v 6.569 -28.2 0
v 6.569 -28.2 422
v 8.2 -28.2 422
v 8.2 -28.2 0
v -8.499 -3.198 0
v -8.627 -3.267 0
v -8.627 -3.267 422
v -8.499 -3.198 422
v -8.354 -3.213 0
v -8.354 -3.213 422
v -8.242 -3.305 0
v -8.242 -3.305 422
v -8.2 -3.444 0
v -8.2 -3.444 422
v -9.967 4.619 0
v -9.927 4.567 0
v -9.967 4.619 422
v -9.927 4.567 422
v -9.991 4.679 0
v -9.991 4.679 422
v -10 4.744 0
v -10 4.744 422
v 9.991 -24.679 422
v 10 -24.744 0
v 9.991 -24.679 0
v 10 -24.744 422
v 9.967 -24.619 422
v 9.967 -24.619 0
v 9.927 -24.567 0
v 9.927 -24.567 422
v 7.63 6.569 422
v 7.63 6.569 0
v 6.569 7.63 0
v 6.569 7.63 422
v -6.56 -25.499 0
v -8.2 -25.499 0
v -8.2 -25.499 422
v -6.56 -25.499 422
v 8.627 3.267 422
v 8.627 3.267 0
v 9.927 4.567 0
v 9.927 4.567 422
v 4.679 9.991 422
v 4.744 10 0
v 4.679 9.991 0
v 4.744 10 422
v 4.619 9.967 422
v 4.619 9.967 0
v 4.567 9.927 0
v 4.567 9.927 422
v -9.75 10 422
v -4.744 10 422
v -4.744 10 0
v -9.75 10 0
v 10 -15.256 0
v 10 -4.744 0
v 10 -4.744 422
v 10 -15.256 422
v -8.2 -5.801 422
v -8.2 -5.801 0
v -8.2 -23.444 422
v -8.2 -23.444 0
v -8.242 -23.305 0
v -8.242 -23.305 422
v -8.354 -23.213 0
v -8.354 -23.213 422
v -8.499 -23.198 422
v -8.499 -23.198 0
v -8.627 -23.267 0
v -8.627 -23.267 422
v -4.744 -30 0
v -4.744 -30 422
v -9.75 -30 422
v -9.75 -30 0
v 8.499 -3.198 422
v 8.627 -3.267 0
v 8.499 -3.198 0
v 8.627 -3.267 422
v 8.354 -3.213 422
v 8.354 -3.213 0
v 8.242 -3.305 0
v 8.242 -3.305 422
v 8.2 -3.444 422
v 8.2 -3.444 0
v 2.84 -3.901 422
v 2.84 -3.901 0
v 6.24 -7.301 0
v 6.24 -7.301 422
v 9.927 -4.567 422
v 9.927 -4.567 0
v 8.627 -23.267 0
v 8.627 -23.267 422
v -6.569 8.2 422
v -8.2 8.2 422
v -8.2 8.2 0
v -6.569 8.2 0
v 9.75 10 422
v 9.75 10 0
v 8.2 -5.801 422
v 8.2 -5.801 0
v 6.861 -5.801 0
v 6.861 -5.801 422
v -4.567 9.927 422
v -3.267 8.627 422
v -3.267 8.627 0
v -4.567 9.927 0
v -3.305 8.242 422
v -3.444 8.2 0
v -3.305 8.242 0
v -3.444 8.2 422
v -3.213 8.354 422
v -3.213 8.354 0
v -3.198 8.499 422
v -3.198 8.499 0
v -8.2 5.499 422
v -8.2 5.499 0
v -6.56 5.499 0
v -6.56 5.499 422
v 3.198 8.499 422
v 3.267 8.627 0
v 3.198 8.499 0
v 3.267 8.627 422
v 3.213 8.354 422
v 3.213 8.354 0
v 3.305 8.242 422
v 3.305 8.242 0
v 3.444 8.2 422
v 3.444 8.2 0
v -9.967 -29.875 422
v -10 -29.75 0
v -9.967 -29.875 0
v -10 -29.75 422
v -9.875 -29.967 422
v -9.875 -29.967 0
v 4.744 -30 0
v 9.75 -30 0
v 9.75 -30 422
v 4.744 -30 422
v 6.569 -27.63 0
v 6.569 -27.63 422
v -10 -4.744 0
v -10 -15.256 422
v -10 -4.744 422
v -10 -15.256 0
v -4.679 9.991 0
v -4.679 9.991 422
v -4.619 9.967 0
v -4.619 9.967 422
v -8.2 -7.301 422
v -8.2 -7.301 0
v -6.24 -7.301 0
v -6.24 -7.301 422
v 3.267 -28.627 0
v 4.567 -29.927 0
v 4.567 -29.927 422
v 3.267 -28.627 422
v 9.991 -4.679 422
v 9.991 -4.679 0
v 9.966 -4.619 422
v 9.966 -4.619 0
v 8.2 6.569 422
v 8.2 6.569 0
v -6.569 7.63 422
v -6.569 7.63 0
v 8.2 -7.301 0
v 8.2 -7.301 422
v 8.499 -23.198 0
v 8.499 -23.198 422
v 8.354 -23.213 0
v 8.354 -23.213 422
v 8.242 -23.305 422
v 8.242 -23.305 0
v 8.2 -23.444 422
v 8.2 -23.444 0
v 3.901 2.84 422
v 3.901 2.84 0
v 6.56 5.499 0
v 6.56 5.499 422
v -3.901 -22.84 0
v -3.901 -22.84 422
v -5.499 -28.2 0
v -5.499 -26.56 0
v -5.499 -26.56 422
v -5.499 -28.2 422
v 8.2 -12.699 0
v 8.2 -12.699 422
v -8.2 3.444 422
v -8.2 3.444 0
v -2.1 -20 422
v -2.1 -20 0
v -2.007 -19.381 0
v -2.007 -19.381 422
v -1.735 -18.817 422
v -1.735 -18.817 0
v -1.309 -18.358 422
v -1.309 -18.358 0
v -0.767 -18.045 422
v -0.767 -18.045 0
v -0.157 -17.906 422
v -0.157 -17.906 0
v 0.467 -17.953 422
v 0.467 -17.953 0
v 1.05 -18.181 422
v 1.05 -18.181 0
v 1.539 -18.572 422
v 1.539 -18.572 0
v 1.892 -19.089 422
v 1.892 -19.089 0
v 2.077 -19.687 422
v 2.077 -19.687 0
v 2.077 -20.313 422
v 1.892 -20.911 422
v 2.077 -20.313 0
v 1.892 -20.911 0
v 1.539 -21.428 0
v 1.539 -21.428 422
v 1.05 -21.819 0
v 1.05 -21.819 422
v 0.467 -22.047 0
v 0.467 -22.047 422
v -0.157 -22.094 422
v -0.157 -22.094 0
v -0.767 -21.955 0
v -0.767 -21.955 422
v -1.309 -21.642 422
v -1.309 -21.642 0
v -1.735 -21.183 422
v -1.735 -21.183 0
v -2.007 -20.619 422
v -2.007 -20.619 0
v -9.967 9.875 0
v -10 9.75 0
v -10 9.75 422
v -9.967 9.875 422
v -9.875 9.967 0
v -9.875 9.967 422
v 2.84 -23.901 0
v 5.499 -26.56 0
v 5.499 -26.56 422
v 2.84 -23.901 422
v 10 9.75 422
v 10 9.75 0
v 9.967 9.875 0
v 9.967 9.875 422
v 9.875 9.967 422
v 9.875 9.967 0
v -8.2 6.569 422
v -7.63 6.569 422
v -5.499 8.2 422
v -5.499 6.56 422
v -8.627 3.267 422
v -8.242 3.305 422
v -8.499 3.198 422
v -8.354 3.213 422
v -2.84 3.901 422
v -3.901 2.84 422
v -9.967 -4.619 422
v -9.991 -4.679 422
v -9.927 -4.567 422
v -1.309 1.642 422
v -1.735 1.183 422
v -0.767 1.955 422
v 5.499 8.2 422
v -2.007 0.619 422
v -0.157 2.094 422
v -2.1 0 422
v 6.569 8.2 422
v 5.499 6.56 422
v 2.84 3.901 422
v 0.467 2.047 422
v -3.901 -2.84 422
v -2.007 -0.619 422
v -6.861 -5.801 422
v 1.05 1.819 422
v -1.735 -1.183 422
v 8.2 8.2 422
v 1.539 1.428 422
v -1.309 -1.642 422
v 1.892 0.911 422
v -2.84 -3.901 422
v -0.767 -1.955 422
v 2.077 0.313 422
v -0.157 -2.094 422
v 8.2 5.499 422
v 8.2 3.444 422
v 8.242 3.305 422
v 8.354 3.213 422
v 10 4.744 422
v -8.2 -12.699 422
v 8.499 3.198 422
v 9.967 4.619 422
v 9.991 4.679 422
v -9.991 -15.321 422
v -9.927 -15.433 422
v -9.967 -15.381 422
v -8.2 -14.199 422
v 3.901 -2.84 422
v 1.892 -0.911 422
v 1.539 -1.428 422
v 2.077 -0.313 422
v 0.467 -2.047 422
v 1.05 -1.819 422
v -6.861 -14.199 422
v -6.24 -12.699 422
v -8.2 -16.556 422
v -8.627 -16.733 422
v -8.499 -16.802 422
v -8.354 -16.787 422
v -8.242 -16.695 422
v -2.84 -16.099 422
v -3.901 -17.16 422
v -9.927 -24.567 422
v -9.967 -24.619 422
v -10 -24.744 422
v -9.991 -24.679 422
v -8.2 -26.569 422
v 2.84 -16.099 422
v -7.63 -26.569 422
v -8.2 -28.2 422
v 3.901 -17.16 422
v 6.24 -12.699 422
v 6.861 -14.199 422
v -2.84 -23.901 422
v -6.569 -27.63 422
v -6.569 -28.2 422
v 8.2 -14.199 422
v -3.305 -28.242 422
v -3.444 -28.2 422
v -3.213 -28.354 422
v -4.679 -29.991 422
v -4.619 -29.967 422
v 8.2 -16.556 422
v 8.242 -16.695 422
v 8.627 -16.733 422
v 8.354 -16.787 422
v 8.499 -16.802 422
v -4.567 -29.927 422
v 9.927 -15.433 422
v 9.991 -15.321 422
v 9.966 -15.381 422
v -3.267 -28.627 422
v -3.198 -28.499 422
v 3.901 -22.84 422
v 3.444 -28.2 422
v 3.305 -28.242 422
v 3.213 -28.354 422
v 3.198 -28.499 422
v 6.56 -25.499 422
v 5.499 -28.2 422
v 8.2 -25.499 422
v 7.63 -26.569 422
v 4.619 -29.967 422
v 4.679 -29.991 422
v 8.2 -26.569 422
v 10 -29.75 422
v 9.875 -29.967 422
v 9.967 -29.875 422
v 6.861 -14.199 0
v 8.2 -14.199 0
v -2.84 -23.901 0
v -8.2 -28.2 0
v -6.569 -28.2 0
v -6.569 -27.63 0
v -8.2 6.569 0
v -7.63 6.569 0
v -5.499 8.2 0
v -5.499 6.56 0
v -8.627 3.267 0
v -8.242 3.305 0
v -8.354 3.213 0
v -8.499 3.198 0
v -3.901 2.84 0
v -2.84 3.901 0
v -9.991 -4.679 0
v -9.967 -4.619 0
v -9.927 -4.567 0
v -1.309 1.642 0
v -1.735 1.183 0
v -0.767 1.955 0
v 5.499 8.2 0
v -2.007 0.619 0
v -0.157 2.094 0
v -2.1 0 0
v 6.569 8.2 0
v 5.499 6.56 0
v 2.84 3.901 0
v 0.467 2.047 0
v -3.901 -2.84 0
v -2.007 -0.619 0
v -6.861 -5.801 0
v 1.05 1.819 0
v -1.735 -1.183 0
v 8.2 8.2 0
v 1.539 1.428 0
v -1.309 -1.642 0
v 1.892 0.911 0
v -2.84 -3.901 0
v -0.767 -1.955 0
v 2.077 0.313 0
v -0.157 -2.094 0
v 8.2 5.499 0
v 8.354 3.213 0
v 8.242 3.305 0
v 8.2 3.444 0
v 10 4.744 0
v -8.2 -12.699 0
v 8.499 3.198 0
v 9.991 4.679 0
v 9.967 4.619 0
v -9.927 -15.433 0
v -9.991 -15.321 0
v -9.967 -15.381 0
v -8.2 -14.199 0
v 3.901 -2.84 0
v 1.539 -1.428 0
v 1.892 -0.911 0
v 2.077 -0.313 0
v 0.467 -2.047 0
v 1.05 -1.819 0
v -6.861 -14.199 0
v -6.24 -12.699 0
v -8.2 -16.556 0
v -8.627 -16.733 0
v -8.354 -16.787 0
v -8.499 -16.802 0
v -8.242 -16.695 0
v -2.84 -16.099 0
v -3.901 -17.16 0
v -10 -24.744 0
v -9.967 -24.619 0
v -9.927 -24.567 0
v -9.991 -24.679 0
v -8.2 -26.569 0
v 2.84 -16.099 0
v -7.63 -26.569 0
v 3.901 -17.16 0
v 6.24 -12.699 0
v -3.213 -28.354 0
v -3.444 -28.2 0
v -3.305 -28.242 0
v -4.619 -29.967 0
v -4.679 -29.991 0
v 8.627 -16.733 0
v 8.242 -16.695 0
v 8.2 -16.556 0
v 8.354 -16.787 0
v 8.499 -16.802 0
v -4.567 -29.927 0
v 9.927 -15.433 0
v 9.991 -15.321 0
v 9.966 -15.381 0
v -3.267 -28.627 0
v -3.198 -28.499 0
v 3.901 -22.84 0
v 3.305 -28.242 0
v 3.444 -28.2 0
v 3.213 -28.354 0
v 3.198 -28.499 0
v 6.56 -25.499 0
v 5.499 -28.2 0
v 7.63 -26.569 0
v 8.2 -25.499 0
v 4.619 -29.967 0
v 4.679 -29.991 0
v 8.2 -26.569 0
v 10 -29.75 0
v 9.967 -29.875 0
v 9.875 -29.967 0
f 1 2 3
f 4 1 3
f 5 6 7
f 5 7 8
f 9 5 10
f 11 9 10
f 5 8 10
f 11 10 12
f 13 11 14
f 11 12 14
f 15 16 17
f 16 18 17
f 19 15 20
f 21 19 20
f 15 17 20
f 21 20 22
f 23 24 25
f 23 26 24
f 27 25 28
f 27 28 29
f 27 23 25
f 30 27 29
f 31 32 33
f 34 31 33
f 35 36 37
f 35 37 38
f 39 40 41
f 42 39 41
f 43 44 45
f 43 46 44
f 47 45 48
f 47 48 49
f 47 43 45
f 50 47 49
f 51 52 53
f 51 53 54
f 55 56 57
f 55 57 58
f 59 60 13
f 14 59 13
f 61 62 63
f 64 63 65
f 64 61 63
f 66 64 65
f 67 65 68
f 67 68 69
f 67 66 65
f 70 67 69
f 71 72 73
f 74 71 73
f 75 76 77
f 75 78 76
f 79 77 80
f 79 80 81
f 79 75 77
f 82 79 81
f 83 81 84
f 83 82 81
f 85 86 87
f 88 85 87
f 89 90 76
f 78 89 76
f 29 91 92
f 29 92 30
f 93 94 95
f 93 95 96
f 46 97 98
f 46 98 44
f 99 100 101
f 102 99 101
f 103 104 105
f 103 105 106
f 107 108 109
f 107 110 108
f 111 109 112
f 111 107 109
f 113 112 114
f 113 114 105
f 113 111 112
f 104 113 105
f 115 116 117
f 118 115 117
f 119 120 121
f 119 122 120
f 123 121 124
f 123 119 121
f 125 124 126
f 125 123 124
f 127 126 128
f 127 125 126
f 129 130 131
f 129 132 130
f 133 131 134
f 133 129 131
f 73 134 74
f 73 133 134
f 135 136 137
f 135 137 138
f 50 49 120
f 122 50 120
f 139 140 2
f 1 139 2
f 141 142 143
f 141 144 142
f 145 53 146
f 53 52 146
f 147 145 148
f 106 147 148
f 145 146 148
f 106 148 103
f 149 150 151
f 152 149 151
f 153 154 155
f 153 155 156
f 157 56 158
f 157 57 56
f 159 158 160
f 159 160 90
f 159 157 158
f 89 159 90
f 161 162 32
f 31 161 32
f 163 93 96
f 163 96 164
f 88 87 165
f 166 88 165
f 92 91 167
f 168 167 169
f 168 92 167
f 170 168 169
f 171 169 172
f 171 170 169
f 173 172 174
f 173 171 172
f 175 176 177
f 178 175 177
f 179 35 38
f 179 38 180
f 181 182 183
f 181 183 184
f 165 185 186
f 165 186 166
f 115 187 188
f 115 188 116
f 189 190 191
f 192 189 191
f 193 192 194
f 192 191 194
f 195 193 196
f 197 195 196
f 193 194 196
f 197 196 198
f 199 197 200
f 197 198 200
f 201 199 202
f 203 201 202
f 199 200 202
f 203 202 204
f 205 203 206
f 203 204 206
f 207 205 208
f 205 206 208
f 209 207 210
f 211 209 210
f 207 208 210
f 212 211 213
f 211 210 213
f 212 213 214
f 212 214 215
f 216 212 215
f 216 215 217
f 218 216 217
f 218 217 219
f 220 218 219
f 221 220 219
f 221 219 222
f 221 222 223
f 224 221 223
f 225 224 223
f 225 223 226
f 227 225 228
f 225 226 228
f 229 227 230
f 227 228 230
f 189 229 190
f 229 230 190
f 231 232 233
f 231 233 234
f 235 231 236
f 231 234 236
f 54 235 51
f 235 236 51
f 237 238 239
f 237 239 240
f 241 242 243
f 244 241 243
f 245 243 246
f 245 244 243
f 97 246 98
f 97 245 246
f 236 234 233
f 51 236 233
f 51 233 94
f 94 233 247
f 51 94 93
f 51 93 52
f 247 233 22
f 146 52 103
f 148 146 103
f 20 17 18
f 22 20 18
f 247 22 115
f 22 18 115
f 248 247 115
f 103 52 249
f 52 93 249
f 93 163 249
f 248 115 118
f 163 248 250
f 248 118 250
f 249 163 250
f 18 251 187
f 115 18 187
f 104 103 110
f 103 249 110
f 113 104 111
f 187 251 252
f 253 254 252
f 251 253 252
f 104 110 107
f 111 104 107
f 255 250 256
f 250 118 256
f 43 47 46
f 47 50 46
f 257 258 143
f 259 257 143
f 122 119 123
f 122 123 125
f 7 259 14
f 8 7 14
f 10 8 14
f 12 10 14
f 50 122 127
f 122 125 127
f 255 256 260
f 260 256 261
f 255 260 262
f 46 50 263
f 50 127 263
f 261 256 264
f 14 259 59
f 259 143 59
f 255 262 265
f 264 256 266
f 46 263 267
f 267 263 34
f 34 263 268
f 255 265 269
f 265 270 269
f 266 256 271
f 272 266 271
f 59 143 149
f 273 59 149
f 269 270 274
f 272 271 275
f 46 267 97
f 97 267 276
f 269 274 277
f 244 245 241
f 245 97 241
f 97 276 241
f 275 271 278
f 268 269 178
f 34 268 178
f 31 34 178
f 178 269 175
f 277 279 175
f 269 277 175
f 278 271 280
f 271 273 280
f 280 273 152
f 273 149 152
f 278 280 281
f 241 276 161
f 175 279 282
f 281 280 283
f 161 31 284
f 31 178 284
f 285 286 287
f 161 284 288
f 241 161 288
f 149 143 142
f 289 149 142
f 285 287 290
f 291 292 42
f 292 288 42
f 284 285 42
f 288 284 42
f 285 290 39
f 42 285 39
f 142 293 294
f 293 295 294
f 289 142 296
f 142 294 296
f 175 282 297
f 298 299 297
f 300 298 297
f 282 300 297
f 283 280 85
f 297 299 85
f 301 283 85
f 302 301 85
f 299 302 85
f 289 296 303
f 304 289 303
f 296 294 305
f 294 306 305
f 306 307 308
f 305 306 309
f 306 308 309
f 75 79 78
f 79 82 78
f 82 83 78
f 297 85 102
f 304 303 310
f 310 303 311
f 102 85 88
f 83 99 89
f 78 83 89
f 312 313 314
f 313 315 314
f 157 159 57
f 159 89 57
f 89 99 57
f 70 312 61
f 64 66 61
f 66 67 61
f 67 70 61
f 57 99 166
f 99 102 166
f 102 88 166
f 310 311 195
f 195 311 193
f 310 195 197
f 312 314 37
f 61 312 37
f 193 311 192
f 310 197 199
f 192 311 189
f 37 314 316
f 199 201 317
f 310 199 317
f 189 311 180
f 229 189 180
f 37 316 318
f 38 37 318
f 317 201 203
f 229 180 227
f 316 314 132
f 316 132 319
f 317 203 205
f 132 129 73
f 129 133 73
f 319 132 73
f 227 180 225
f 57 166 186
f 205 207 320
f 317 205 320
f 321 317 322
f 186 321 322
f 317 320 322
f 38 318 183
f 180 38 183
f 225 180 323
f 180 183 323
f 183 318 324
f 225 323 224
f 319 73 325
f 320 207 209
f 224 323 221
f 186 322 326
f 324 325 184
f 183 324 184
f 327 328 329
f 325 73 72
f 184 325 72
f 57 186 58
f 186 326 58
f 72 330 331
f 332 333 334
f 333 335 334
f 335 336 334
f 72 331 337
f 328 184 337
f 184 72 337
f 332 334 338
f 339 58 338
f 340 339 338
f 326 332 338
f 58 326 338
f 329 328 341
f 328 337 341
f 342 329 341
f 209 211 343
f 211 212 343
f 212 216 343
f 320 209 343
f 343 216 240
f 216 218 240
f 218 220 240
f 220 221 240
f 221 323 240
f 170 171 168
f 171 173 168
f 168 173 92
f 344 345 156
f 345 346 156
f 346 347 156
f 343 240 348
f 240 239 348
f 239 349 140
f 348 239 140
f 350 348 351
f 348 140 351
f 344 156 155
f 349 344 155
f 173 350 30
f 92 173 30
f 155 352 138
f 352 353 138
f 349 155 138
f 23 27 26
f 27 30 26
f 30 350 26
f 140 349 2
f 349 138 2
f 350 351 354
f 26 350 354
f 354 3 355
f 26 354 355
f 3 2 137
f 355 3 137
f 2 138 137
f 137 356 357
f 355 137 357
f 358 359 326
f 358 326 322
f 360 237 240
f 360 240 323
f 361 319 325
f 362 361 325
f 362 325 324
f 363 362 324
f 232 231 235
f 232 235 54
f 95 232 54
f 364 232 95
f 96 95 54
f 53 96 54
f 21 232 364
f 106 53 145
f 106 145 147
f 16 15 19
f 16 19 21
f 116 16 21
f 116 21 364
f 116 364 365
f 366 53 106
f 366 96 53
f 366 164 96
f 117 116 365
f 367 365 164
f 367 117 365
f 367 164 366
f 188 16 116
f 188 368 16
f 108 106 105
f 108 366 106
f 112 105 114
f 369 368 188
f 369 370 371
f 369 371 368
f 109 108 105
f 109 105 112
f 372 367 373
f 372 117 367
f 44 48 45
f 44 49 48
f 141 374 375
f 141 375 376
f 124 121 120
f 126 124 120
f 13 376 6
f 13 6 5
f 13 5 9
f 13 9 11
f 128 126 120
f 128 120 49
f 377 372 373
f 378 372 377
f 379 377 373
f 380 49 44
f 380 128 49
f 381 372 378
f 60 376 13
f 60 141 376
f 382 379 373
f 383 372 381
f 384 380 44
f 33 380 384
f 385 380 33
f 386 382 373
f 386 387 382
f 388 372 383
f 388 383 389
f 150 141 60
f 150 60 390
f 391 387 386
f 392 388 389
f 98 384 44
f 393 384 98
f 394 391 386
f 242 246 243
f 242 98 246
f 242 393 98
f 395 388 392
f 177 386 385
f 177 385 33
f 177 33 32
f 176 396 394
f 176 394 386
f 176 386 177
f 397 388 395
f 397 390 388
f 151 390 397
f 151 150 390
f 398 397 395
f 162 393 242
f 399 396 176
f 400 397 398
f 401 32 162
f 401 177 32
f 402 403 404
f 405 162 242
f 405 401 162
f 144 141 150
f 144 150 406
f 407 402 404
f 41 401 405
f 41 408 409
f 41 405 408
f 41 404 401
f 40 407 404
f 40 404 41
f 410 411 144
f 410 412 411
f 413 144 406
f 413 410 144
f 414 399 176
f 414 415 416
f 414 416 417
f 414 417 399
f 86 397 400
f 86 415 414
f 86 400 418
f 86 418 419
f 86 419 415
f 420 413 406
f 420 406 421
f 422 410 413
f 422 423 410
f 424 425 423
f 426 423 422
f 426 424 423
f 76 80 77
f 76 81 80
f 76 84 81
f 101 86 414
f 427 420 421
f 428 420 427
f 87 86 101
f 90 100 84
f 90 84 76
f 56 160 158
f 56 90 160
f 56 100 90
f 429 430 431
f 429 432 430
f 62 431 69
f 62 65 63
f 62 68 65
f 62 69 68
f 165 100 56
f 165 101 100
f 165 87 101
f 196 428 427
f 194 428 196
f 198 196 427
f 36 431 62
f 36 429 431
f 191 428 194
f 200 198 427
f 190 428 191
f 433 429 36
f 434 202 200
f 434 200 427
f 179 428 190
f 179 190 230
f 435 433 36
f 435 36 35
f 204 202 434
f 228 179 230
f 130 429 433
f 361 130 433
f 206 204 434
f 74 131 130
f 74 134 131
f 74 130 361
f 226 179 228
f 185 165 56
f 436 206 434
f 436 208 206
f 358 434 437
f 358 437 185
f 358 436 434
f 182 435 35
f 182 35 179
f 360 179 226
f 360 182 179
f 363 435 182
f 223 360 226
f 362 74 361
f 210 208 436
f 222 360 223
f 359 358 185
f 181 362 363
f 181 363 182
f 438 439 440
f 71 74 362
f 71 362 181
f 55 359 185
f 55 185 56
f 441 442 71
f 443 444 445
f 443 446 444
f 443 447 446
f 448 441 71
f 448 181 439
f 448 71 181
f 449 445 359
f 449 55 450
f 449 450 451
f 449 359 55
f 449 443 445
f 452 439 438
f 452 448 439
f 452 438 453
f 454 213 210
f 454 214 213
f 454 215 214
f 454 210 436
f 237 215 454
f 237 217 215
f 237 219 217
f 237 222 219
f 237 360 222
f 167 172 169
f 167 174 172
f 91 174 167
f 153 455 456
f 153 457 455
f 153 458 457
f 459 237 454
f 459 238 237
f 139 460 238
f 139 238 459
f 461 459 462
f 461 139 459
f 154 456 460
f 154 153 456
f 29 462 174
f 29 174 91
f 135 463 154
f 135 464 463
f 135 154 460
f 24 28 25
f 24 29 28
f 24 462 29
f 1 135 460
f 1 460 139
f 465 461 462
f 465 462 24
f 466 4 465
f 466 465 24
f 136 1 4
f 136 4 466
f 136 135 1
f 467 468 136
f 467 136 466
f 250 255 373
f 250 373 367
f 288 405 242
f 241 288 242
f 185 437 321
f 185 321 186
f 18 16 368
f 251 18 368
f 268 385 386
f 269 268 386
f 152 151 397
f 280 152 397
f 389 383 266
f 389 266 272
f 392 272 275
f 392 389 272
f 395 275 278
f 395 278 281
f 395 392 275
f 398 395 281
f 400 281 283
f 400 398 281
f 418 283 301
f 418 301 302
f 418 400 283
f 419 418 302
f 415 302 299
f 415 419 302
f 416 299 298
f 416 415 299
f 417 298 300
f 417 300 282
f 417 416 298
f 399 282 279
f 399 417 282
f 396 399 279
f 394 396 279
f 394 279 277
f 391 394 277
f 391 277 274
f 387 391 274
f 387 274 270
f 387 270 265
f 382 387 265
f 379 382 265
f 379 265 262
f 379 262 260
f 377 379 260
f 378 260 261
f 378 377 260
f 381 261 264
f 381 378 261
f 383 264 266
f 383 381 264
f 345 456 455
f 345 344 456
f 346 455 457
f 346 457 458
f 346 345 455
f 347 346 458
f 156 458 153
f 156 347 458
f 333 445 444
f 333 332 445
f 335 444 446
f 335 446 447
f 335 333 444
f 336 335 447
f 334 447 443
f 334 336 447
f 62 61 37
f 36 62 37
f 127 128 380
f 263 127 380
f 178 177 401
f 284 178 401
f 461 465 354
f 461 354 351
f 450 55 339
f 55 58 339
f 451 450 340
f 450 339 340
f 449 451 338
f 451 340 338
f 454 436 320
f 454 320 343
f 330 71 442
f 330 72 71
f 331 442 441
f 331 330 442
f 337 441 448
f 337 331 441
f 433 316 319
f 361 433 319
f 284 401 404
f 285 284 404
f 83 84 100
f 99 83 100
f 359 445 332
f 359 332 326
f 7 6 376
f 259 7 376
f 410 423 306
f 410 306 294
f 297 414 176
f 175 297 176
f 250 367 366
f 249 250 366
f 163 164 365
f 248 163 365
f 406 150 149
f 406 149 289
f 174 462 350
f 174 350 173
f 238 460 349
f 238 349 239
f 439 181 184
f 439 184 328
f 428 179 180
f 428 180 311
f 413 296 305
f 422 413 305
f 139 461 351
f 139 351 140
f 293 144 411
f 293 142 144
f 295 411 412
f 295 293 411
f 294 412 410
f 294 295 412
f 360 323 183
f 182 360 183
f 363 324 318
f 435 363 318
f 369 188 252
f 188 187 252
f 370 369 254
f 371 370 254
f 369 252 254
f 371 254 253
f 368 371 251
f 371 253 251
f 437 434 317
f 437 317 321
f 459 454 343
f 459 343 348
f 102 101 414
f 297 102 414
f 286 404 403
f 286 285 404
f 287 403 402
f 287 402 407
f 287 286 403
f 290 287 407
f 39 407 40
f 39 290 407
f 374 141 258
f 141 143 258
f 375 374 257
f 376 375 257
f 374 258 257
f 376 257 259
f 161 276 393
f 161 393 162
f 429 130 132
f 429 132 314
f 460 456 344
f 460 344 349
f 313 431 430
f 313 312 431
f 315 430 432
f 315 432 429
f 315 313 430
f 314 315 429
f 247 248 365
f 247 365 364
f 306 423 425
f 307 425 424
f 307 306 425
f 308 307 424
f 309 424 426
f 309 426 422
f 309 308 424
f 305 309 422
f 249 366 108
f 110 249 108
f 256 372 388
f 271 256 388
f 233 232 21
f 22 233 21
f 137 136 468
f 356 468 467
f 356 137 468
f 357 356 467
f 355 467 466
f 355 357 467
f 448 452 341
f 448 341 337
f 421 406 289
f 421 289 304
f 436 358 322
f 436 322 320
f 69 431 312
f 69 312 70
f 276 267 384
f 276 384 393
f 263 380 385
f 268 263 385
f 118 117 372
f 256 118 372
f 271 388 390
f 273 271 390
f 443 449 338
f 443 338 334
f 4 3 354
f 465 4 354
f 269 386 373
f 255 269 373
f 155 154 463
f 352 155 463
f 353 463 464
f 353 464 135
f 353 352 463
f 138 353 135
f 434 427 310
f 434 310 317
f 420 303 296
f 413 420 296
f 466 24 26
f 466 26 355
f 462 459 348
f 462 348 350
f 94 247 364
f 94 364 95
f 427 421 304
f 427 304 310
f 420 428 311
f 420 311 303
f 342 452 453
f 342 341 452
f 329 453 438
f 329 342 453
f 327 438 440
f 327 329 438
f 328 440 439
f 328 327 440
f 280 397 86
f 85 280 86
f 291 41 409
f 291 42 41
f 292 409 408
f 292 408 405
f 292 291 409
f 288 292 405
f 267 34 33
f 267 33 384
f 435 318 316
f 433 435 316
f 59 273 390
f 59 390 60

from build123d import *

# Parameters (mm, degrees)
SKETCH1_R            = 2.1
BOSS_EXTRUDE2_DEPTH  = 422
CUT_EXTRUDE1_DEPTH   = 423.236900478
FILLET1_R            = 0.25
FILLET1_OF_MIRROR1_R = 0.25


with BuildPart() as part:
    # Sketch1 → Boss-Extrude2 (new body)
    with BuildSketch(Plane.XY):
        Polygon((8.199993721, -10), (9.999993721, -10), (9.999993721, -4.63999575), (8.199993721, -2.84), (8.199993721, -5.800653822), (6.861313026, -5.800653822), (3.900652213, -2.84), (3.900652213, 2.84), (6.559993721, 5.499347787), (8.199993721, 5.499347787), (8.199993721, 2.84), (9.999993721, 4.64000425), (9.999993721, 10), (4.63999575, 10), (2.84, 8.2), (5.499325592, 8.2), (5.499325592, 6.56), (2.84, 3.900668129), (-2.84, 3.900668129), (-5.49933815, 6.56), (-5.49933815, 8.2), (-2.84, 8.2), (-4.64000425, 10), (-10.000006279, 10), (-10.000006279, 4.63999575), (-8.200006279, 2.84), (-8.200006279, 5.499347787), (-6.560006279, 5.499347787), (-3.900652213, 2.84), (-3.900652213, -2.84), (-6.861299044, -5.800653822), (-8.200006279, -5.800653822), (-8.200006279, -2.84), (-10.000006279, -4.64000425), (-10.000006279, -10), (-8.200006279, -10), (-8.200006279, -7.300653822), (-6.239977665, -7.300653822), (-2.84, -3.900668129), (2.84, -3.900668129), (6.239993721, -7.300653822), (8.199993721, -7.300653822), align=None)
        with Locations(Location((0, 0, 0), (0, 0, 180))):
            Circle(SKETCH1_R, mode=Mode.SUBTRACT)
    boss_extrude2 = extrude(amount=BOSS_EXTRUDE2_DEPTH)

    # Sketch2 → Cut-Extrude1 (cut, through all)
    with BuildSketch(Plane.XY.offset(422)):
        Polygon((-8.200006279, 6.569347787), (-8.200006279, 8.2), (-6.56933815, 8.2), (-6.56933815, 7.630009211), (-7.62999707, 6.569347787), align=None)
        Polygon((8.199993721, 8.2), (8.199993721, 6.569347787), (7.629987016, 6.569347787), (6.569325592, 7.630006706), (6.569325592, 8.2), align=None)
    cut_extrude1 = extrude(amount=-CUT_EXTRUDE1_DEPTH, mode=Mode.SUBTRACT)

    # Fillet1
    fillet1_edges = [part.edges().sort_by_distance(p)[0] for p in [
        (9.999993721, -4.63999575, 211),
        (-10.000006279, -4.64000425, 211),
        (-8.200006279, -2.84, 211),
        (-8.200006279, 2.84, 211),
        (-10.000006279, 4.63999575, 211),
        (-10.000006279, 10, 211),
        (-4.64000425, 10, 211),
        (-2.84, 8.2, 211),
        (2.84, 8.2, 211),
        (4.63999575, 10, 211),
        (9.999993721, 10, 211),
        (9.999993721, 4.64000425, 211),
        (8.199993721, 2.84, 211),
        (8.199993721, -2.84, 211),
    ]]
    fillet(fillet1_edges, radius=FILLET1_R)

    # Mirror1: Boss-Extrude2 across plane
    add(boss_extrude2.mirror(Plane(origin=(0, -10, 0), x_dir=(0, 0, 1), z_dir=(0, -1, 0))))

    # Fillet1 of Mirror1
    fillet1_of_mirror1_edges = [part.edges().sort_by_distance(p)[0] for p in [
        (9.999993721, -15.36000425, 211),
        (-10.000006279, -15.35999575, 211),
        (-8.200006279, -17.16, 211),
        (-8.200006279, -22.84, 211),
        (-10.000006279, -24.63999575, 211),
        (-10.000006279, -30, 211),
        (-4.64000425, -30, 211),
        (-2.84, -28.2, 211),
        (2.84, -28.2, 211),
        (4.63999575, -30, 211),
        (9.999993721, -30, 211),
        (9.999993721, -24.64000425, 211),
        (8.199993721, -22.84, 211),
        (8.199993721, -17.16, 211),
    ]]
    fillet(fillet1_of_mirror1_edges, radius=FILLET1_OF_MIRROR1_R)

    # Mirror2: Cut-Extrude1 across plane
    add(cut_extrude1.mirror(Plane(origin=(0, -10, 0), x_dir=(0, 0, 1), z_dir=(0, -1, 0))), mode=Mode.SUBTRACT)


solid = part.part
